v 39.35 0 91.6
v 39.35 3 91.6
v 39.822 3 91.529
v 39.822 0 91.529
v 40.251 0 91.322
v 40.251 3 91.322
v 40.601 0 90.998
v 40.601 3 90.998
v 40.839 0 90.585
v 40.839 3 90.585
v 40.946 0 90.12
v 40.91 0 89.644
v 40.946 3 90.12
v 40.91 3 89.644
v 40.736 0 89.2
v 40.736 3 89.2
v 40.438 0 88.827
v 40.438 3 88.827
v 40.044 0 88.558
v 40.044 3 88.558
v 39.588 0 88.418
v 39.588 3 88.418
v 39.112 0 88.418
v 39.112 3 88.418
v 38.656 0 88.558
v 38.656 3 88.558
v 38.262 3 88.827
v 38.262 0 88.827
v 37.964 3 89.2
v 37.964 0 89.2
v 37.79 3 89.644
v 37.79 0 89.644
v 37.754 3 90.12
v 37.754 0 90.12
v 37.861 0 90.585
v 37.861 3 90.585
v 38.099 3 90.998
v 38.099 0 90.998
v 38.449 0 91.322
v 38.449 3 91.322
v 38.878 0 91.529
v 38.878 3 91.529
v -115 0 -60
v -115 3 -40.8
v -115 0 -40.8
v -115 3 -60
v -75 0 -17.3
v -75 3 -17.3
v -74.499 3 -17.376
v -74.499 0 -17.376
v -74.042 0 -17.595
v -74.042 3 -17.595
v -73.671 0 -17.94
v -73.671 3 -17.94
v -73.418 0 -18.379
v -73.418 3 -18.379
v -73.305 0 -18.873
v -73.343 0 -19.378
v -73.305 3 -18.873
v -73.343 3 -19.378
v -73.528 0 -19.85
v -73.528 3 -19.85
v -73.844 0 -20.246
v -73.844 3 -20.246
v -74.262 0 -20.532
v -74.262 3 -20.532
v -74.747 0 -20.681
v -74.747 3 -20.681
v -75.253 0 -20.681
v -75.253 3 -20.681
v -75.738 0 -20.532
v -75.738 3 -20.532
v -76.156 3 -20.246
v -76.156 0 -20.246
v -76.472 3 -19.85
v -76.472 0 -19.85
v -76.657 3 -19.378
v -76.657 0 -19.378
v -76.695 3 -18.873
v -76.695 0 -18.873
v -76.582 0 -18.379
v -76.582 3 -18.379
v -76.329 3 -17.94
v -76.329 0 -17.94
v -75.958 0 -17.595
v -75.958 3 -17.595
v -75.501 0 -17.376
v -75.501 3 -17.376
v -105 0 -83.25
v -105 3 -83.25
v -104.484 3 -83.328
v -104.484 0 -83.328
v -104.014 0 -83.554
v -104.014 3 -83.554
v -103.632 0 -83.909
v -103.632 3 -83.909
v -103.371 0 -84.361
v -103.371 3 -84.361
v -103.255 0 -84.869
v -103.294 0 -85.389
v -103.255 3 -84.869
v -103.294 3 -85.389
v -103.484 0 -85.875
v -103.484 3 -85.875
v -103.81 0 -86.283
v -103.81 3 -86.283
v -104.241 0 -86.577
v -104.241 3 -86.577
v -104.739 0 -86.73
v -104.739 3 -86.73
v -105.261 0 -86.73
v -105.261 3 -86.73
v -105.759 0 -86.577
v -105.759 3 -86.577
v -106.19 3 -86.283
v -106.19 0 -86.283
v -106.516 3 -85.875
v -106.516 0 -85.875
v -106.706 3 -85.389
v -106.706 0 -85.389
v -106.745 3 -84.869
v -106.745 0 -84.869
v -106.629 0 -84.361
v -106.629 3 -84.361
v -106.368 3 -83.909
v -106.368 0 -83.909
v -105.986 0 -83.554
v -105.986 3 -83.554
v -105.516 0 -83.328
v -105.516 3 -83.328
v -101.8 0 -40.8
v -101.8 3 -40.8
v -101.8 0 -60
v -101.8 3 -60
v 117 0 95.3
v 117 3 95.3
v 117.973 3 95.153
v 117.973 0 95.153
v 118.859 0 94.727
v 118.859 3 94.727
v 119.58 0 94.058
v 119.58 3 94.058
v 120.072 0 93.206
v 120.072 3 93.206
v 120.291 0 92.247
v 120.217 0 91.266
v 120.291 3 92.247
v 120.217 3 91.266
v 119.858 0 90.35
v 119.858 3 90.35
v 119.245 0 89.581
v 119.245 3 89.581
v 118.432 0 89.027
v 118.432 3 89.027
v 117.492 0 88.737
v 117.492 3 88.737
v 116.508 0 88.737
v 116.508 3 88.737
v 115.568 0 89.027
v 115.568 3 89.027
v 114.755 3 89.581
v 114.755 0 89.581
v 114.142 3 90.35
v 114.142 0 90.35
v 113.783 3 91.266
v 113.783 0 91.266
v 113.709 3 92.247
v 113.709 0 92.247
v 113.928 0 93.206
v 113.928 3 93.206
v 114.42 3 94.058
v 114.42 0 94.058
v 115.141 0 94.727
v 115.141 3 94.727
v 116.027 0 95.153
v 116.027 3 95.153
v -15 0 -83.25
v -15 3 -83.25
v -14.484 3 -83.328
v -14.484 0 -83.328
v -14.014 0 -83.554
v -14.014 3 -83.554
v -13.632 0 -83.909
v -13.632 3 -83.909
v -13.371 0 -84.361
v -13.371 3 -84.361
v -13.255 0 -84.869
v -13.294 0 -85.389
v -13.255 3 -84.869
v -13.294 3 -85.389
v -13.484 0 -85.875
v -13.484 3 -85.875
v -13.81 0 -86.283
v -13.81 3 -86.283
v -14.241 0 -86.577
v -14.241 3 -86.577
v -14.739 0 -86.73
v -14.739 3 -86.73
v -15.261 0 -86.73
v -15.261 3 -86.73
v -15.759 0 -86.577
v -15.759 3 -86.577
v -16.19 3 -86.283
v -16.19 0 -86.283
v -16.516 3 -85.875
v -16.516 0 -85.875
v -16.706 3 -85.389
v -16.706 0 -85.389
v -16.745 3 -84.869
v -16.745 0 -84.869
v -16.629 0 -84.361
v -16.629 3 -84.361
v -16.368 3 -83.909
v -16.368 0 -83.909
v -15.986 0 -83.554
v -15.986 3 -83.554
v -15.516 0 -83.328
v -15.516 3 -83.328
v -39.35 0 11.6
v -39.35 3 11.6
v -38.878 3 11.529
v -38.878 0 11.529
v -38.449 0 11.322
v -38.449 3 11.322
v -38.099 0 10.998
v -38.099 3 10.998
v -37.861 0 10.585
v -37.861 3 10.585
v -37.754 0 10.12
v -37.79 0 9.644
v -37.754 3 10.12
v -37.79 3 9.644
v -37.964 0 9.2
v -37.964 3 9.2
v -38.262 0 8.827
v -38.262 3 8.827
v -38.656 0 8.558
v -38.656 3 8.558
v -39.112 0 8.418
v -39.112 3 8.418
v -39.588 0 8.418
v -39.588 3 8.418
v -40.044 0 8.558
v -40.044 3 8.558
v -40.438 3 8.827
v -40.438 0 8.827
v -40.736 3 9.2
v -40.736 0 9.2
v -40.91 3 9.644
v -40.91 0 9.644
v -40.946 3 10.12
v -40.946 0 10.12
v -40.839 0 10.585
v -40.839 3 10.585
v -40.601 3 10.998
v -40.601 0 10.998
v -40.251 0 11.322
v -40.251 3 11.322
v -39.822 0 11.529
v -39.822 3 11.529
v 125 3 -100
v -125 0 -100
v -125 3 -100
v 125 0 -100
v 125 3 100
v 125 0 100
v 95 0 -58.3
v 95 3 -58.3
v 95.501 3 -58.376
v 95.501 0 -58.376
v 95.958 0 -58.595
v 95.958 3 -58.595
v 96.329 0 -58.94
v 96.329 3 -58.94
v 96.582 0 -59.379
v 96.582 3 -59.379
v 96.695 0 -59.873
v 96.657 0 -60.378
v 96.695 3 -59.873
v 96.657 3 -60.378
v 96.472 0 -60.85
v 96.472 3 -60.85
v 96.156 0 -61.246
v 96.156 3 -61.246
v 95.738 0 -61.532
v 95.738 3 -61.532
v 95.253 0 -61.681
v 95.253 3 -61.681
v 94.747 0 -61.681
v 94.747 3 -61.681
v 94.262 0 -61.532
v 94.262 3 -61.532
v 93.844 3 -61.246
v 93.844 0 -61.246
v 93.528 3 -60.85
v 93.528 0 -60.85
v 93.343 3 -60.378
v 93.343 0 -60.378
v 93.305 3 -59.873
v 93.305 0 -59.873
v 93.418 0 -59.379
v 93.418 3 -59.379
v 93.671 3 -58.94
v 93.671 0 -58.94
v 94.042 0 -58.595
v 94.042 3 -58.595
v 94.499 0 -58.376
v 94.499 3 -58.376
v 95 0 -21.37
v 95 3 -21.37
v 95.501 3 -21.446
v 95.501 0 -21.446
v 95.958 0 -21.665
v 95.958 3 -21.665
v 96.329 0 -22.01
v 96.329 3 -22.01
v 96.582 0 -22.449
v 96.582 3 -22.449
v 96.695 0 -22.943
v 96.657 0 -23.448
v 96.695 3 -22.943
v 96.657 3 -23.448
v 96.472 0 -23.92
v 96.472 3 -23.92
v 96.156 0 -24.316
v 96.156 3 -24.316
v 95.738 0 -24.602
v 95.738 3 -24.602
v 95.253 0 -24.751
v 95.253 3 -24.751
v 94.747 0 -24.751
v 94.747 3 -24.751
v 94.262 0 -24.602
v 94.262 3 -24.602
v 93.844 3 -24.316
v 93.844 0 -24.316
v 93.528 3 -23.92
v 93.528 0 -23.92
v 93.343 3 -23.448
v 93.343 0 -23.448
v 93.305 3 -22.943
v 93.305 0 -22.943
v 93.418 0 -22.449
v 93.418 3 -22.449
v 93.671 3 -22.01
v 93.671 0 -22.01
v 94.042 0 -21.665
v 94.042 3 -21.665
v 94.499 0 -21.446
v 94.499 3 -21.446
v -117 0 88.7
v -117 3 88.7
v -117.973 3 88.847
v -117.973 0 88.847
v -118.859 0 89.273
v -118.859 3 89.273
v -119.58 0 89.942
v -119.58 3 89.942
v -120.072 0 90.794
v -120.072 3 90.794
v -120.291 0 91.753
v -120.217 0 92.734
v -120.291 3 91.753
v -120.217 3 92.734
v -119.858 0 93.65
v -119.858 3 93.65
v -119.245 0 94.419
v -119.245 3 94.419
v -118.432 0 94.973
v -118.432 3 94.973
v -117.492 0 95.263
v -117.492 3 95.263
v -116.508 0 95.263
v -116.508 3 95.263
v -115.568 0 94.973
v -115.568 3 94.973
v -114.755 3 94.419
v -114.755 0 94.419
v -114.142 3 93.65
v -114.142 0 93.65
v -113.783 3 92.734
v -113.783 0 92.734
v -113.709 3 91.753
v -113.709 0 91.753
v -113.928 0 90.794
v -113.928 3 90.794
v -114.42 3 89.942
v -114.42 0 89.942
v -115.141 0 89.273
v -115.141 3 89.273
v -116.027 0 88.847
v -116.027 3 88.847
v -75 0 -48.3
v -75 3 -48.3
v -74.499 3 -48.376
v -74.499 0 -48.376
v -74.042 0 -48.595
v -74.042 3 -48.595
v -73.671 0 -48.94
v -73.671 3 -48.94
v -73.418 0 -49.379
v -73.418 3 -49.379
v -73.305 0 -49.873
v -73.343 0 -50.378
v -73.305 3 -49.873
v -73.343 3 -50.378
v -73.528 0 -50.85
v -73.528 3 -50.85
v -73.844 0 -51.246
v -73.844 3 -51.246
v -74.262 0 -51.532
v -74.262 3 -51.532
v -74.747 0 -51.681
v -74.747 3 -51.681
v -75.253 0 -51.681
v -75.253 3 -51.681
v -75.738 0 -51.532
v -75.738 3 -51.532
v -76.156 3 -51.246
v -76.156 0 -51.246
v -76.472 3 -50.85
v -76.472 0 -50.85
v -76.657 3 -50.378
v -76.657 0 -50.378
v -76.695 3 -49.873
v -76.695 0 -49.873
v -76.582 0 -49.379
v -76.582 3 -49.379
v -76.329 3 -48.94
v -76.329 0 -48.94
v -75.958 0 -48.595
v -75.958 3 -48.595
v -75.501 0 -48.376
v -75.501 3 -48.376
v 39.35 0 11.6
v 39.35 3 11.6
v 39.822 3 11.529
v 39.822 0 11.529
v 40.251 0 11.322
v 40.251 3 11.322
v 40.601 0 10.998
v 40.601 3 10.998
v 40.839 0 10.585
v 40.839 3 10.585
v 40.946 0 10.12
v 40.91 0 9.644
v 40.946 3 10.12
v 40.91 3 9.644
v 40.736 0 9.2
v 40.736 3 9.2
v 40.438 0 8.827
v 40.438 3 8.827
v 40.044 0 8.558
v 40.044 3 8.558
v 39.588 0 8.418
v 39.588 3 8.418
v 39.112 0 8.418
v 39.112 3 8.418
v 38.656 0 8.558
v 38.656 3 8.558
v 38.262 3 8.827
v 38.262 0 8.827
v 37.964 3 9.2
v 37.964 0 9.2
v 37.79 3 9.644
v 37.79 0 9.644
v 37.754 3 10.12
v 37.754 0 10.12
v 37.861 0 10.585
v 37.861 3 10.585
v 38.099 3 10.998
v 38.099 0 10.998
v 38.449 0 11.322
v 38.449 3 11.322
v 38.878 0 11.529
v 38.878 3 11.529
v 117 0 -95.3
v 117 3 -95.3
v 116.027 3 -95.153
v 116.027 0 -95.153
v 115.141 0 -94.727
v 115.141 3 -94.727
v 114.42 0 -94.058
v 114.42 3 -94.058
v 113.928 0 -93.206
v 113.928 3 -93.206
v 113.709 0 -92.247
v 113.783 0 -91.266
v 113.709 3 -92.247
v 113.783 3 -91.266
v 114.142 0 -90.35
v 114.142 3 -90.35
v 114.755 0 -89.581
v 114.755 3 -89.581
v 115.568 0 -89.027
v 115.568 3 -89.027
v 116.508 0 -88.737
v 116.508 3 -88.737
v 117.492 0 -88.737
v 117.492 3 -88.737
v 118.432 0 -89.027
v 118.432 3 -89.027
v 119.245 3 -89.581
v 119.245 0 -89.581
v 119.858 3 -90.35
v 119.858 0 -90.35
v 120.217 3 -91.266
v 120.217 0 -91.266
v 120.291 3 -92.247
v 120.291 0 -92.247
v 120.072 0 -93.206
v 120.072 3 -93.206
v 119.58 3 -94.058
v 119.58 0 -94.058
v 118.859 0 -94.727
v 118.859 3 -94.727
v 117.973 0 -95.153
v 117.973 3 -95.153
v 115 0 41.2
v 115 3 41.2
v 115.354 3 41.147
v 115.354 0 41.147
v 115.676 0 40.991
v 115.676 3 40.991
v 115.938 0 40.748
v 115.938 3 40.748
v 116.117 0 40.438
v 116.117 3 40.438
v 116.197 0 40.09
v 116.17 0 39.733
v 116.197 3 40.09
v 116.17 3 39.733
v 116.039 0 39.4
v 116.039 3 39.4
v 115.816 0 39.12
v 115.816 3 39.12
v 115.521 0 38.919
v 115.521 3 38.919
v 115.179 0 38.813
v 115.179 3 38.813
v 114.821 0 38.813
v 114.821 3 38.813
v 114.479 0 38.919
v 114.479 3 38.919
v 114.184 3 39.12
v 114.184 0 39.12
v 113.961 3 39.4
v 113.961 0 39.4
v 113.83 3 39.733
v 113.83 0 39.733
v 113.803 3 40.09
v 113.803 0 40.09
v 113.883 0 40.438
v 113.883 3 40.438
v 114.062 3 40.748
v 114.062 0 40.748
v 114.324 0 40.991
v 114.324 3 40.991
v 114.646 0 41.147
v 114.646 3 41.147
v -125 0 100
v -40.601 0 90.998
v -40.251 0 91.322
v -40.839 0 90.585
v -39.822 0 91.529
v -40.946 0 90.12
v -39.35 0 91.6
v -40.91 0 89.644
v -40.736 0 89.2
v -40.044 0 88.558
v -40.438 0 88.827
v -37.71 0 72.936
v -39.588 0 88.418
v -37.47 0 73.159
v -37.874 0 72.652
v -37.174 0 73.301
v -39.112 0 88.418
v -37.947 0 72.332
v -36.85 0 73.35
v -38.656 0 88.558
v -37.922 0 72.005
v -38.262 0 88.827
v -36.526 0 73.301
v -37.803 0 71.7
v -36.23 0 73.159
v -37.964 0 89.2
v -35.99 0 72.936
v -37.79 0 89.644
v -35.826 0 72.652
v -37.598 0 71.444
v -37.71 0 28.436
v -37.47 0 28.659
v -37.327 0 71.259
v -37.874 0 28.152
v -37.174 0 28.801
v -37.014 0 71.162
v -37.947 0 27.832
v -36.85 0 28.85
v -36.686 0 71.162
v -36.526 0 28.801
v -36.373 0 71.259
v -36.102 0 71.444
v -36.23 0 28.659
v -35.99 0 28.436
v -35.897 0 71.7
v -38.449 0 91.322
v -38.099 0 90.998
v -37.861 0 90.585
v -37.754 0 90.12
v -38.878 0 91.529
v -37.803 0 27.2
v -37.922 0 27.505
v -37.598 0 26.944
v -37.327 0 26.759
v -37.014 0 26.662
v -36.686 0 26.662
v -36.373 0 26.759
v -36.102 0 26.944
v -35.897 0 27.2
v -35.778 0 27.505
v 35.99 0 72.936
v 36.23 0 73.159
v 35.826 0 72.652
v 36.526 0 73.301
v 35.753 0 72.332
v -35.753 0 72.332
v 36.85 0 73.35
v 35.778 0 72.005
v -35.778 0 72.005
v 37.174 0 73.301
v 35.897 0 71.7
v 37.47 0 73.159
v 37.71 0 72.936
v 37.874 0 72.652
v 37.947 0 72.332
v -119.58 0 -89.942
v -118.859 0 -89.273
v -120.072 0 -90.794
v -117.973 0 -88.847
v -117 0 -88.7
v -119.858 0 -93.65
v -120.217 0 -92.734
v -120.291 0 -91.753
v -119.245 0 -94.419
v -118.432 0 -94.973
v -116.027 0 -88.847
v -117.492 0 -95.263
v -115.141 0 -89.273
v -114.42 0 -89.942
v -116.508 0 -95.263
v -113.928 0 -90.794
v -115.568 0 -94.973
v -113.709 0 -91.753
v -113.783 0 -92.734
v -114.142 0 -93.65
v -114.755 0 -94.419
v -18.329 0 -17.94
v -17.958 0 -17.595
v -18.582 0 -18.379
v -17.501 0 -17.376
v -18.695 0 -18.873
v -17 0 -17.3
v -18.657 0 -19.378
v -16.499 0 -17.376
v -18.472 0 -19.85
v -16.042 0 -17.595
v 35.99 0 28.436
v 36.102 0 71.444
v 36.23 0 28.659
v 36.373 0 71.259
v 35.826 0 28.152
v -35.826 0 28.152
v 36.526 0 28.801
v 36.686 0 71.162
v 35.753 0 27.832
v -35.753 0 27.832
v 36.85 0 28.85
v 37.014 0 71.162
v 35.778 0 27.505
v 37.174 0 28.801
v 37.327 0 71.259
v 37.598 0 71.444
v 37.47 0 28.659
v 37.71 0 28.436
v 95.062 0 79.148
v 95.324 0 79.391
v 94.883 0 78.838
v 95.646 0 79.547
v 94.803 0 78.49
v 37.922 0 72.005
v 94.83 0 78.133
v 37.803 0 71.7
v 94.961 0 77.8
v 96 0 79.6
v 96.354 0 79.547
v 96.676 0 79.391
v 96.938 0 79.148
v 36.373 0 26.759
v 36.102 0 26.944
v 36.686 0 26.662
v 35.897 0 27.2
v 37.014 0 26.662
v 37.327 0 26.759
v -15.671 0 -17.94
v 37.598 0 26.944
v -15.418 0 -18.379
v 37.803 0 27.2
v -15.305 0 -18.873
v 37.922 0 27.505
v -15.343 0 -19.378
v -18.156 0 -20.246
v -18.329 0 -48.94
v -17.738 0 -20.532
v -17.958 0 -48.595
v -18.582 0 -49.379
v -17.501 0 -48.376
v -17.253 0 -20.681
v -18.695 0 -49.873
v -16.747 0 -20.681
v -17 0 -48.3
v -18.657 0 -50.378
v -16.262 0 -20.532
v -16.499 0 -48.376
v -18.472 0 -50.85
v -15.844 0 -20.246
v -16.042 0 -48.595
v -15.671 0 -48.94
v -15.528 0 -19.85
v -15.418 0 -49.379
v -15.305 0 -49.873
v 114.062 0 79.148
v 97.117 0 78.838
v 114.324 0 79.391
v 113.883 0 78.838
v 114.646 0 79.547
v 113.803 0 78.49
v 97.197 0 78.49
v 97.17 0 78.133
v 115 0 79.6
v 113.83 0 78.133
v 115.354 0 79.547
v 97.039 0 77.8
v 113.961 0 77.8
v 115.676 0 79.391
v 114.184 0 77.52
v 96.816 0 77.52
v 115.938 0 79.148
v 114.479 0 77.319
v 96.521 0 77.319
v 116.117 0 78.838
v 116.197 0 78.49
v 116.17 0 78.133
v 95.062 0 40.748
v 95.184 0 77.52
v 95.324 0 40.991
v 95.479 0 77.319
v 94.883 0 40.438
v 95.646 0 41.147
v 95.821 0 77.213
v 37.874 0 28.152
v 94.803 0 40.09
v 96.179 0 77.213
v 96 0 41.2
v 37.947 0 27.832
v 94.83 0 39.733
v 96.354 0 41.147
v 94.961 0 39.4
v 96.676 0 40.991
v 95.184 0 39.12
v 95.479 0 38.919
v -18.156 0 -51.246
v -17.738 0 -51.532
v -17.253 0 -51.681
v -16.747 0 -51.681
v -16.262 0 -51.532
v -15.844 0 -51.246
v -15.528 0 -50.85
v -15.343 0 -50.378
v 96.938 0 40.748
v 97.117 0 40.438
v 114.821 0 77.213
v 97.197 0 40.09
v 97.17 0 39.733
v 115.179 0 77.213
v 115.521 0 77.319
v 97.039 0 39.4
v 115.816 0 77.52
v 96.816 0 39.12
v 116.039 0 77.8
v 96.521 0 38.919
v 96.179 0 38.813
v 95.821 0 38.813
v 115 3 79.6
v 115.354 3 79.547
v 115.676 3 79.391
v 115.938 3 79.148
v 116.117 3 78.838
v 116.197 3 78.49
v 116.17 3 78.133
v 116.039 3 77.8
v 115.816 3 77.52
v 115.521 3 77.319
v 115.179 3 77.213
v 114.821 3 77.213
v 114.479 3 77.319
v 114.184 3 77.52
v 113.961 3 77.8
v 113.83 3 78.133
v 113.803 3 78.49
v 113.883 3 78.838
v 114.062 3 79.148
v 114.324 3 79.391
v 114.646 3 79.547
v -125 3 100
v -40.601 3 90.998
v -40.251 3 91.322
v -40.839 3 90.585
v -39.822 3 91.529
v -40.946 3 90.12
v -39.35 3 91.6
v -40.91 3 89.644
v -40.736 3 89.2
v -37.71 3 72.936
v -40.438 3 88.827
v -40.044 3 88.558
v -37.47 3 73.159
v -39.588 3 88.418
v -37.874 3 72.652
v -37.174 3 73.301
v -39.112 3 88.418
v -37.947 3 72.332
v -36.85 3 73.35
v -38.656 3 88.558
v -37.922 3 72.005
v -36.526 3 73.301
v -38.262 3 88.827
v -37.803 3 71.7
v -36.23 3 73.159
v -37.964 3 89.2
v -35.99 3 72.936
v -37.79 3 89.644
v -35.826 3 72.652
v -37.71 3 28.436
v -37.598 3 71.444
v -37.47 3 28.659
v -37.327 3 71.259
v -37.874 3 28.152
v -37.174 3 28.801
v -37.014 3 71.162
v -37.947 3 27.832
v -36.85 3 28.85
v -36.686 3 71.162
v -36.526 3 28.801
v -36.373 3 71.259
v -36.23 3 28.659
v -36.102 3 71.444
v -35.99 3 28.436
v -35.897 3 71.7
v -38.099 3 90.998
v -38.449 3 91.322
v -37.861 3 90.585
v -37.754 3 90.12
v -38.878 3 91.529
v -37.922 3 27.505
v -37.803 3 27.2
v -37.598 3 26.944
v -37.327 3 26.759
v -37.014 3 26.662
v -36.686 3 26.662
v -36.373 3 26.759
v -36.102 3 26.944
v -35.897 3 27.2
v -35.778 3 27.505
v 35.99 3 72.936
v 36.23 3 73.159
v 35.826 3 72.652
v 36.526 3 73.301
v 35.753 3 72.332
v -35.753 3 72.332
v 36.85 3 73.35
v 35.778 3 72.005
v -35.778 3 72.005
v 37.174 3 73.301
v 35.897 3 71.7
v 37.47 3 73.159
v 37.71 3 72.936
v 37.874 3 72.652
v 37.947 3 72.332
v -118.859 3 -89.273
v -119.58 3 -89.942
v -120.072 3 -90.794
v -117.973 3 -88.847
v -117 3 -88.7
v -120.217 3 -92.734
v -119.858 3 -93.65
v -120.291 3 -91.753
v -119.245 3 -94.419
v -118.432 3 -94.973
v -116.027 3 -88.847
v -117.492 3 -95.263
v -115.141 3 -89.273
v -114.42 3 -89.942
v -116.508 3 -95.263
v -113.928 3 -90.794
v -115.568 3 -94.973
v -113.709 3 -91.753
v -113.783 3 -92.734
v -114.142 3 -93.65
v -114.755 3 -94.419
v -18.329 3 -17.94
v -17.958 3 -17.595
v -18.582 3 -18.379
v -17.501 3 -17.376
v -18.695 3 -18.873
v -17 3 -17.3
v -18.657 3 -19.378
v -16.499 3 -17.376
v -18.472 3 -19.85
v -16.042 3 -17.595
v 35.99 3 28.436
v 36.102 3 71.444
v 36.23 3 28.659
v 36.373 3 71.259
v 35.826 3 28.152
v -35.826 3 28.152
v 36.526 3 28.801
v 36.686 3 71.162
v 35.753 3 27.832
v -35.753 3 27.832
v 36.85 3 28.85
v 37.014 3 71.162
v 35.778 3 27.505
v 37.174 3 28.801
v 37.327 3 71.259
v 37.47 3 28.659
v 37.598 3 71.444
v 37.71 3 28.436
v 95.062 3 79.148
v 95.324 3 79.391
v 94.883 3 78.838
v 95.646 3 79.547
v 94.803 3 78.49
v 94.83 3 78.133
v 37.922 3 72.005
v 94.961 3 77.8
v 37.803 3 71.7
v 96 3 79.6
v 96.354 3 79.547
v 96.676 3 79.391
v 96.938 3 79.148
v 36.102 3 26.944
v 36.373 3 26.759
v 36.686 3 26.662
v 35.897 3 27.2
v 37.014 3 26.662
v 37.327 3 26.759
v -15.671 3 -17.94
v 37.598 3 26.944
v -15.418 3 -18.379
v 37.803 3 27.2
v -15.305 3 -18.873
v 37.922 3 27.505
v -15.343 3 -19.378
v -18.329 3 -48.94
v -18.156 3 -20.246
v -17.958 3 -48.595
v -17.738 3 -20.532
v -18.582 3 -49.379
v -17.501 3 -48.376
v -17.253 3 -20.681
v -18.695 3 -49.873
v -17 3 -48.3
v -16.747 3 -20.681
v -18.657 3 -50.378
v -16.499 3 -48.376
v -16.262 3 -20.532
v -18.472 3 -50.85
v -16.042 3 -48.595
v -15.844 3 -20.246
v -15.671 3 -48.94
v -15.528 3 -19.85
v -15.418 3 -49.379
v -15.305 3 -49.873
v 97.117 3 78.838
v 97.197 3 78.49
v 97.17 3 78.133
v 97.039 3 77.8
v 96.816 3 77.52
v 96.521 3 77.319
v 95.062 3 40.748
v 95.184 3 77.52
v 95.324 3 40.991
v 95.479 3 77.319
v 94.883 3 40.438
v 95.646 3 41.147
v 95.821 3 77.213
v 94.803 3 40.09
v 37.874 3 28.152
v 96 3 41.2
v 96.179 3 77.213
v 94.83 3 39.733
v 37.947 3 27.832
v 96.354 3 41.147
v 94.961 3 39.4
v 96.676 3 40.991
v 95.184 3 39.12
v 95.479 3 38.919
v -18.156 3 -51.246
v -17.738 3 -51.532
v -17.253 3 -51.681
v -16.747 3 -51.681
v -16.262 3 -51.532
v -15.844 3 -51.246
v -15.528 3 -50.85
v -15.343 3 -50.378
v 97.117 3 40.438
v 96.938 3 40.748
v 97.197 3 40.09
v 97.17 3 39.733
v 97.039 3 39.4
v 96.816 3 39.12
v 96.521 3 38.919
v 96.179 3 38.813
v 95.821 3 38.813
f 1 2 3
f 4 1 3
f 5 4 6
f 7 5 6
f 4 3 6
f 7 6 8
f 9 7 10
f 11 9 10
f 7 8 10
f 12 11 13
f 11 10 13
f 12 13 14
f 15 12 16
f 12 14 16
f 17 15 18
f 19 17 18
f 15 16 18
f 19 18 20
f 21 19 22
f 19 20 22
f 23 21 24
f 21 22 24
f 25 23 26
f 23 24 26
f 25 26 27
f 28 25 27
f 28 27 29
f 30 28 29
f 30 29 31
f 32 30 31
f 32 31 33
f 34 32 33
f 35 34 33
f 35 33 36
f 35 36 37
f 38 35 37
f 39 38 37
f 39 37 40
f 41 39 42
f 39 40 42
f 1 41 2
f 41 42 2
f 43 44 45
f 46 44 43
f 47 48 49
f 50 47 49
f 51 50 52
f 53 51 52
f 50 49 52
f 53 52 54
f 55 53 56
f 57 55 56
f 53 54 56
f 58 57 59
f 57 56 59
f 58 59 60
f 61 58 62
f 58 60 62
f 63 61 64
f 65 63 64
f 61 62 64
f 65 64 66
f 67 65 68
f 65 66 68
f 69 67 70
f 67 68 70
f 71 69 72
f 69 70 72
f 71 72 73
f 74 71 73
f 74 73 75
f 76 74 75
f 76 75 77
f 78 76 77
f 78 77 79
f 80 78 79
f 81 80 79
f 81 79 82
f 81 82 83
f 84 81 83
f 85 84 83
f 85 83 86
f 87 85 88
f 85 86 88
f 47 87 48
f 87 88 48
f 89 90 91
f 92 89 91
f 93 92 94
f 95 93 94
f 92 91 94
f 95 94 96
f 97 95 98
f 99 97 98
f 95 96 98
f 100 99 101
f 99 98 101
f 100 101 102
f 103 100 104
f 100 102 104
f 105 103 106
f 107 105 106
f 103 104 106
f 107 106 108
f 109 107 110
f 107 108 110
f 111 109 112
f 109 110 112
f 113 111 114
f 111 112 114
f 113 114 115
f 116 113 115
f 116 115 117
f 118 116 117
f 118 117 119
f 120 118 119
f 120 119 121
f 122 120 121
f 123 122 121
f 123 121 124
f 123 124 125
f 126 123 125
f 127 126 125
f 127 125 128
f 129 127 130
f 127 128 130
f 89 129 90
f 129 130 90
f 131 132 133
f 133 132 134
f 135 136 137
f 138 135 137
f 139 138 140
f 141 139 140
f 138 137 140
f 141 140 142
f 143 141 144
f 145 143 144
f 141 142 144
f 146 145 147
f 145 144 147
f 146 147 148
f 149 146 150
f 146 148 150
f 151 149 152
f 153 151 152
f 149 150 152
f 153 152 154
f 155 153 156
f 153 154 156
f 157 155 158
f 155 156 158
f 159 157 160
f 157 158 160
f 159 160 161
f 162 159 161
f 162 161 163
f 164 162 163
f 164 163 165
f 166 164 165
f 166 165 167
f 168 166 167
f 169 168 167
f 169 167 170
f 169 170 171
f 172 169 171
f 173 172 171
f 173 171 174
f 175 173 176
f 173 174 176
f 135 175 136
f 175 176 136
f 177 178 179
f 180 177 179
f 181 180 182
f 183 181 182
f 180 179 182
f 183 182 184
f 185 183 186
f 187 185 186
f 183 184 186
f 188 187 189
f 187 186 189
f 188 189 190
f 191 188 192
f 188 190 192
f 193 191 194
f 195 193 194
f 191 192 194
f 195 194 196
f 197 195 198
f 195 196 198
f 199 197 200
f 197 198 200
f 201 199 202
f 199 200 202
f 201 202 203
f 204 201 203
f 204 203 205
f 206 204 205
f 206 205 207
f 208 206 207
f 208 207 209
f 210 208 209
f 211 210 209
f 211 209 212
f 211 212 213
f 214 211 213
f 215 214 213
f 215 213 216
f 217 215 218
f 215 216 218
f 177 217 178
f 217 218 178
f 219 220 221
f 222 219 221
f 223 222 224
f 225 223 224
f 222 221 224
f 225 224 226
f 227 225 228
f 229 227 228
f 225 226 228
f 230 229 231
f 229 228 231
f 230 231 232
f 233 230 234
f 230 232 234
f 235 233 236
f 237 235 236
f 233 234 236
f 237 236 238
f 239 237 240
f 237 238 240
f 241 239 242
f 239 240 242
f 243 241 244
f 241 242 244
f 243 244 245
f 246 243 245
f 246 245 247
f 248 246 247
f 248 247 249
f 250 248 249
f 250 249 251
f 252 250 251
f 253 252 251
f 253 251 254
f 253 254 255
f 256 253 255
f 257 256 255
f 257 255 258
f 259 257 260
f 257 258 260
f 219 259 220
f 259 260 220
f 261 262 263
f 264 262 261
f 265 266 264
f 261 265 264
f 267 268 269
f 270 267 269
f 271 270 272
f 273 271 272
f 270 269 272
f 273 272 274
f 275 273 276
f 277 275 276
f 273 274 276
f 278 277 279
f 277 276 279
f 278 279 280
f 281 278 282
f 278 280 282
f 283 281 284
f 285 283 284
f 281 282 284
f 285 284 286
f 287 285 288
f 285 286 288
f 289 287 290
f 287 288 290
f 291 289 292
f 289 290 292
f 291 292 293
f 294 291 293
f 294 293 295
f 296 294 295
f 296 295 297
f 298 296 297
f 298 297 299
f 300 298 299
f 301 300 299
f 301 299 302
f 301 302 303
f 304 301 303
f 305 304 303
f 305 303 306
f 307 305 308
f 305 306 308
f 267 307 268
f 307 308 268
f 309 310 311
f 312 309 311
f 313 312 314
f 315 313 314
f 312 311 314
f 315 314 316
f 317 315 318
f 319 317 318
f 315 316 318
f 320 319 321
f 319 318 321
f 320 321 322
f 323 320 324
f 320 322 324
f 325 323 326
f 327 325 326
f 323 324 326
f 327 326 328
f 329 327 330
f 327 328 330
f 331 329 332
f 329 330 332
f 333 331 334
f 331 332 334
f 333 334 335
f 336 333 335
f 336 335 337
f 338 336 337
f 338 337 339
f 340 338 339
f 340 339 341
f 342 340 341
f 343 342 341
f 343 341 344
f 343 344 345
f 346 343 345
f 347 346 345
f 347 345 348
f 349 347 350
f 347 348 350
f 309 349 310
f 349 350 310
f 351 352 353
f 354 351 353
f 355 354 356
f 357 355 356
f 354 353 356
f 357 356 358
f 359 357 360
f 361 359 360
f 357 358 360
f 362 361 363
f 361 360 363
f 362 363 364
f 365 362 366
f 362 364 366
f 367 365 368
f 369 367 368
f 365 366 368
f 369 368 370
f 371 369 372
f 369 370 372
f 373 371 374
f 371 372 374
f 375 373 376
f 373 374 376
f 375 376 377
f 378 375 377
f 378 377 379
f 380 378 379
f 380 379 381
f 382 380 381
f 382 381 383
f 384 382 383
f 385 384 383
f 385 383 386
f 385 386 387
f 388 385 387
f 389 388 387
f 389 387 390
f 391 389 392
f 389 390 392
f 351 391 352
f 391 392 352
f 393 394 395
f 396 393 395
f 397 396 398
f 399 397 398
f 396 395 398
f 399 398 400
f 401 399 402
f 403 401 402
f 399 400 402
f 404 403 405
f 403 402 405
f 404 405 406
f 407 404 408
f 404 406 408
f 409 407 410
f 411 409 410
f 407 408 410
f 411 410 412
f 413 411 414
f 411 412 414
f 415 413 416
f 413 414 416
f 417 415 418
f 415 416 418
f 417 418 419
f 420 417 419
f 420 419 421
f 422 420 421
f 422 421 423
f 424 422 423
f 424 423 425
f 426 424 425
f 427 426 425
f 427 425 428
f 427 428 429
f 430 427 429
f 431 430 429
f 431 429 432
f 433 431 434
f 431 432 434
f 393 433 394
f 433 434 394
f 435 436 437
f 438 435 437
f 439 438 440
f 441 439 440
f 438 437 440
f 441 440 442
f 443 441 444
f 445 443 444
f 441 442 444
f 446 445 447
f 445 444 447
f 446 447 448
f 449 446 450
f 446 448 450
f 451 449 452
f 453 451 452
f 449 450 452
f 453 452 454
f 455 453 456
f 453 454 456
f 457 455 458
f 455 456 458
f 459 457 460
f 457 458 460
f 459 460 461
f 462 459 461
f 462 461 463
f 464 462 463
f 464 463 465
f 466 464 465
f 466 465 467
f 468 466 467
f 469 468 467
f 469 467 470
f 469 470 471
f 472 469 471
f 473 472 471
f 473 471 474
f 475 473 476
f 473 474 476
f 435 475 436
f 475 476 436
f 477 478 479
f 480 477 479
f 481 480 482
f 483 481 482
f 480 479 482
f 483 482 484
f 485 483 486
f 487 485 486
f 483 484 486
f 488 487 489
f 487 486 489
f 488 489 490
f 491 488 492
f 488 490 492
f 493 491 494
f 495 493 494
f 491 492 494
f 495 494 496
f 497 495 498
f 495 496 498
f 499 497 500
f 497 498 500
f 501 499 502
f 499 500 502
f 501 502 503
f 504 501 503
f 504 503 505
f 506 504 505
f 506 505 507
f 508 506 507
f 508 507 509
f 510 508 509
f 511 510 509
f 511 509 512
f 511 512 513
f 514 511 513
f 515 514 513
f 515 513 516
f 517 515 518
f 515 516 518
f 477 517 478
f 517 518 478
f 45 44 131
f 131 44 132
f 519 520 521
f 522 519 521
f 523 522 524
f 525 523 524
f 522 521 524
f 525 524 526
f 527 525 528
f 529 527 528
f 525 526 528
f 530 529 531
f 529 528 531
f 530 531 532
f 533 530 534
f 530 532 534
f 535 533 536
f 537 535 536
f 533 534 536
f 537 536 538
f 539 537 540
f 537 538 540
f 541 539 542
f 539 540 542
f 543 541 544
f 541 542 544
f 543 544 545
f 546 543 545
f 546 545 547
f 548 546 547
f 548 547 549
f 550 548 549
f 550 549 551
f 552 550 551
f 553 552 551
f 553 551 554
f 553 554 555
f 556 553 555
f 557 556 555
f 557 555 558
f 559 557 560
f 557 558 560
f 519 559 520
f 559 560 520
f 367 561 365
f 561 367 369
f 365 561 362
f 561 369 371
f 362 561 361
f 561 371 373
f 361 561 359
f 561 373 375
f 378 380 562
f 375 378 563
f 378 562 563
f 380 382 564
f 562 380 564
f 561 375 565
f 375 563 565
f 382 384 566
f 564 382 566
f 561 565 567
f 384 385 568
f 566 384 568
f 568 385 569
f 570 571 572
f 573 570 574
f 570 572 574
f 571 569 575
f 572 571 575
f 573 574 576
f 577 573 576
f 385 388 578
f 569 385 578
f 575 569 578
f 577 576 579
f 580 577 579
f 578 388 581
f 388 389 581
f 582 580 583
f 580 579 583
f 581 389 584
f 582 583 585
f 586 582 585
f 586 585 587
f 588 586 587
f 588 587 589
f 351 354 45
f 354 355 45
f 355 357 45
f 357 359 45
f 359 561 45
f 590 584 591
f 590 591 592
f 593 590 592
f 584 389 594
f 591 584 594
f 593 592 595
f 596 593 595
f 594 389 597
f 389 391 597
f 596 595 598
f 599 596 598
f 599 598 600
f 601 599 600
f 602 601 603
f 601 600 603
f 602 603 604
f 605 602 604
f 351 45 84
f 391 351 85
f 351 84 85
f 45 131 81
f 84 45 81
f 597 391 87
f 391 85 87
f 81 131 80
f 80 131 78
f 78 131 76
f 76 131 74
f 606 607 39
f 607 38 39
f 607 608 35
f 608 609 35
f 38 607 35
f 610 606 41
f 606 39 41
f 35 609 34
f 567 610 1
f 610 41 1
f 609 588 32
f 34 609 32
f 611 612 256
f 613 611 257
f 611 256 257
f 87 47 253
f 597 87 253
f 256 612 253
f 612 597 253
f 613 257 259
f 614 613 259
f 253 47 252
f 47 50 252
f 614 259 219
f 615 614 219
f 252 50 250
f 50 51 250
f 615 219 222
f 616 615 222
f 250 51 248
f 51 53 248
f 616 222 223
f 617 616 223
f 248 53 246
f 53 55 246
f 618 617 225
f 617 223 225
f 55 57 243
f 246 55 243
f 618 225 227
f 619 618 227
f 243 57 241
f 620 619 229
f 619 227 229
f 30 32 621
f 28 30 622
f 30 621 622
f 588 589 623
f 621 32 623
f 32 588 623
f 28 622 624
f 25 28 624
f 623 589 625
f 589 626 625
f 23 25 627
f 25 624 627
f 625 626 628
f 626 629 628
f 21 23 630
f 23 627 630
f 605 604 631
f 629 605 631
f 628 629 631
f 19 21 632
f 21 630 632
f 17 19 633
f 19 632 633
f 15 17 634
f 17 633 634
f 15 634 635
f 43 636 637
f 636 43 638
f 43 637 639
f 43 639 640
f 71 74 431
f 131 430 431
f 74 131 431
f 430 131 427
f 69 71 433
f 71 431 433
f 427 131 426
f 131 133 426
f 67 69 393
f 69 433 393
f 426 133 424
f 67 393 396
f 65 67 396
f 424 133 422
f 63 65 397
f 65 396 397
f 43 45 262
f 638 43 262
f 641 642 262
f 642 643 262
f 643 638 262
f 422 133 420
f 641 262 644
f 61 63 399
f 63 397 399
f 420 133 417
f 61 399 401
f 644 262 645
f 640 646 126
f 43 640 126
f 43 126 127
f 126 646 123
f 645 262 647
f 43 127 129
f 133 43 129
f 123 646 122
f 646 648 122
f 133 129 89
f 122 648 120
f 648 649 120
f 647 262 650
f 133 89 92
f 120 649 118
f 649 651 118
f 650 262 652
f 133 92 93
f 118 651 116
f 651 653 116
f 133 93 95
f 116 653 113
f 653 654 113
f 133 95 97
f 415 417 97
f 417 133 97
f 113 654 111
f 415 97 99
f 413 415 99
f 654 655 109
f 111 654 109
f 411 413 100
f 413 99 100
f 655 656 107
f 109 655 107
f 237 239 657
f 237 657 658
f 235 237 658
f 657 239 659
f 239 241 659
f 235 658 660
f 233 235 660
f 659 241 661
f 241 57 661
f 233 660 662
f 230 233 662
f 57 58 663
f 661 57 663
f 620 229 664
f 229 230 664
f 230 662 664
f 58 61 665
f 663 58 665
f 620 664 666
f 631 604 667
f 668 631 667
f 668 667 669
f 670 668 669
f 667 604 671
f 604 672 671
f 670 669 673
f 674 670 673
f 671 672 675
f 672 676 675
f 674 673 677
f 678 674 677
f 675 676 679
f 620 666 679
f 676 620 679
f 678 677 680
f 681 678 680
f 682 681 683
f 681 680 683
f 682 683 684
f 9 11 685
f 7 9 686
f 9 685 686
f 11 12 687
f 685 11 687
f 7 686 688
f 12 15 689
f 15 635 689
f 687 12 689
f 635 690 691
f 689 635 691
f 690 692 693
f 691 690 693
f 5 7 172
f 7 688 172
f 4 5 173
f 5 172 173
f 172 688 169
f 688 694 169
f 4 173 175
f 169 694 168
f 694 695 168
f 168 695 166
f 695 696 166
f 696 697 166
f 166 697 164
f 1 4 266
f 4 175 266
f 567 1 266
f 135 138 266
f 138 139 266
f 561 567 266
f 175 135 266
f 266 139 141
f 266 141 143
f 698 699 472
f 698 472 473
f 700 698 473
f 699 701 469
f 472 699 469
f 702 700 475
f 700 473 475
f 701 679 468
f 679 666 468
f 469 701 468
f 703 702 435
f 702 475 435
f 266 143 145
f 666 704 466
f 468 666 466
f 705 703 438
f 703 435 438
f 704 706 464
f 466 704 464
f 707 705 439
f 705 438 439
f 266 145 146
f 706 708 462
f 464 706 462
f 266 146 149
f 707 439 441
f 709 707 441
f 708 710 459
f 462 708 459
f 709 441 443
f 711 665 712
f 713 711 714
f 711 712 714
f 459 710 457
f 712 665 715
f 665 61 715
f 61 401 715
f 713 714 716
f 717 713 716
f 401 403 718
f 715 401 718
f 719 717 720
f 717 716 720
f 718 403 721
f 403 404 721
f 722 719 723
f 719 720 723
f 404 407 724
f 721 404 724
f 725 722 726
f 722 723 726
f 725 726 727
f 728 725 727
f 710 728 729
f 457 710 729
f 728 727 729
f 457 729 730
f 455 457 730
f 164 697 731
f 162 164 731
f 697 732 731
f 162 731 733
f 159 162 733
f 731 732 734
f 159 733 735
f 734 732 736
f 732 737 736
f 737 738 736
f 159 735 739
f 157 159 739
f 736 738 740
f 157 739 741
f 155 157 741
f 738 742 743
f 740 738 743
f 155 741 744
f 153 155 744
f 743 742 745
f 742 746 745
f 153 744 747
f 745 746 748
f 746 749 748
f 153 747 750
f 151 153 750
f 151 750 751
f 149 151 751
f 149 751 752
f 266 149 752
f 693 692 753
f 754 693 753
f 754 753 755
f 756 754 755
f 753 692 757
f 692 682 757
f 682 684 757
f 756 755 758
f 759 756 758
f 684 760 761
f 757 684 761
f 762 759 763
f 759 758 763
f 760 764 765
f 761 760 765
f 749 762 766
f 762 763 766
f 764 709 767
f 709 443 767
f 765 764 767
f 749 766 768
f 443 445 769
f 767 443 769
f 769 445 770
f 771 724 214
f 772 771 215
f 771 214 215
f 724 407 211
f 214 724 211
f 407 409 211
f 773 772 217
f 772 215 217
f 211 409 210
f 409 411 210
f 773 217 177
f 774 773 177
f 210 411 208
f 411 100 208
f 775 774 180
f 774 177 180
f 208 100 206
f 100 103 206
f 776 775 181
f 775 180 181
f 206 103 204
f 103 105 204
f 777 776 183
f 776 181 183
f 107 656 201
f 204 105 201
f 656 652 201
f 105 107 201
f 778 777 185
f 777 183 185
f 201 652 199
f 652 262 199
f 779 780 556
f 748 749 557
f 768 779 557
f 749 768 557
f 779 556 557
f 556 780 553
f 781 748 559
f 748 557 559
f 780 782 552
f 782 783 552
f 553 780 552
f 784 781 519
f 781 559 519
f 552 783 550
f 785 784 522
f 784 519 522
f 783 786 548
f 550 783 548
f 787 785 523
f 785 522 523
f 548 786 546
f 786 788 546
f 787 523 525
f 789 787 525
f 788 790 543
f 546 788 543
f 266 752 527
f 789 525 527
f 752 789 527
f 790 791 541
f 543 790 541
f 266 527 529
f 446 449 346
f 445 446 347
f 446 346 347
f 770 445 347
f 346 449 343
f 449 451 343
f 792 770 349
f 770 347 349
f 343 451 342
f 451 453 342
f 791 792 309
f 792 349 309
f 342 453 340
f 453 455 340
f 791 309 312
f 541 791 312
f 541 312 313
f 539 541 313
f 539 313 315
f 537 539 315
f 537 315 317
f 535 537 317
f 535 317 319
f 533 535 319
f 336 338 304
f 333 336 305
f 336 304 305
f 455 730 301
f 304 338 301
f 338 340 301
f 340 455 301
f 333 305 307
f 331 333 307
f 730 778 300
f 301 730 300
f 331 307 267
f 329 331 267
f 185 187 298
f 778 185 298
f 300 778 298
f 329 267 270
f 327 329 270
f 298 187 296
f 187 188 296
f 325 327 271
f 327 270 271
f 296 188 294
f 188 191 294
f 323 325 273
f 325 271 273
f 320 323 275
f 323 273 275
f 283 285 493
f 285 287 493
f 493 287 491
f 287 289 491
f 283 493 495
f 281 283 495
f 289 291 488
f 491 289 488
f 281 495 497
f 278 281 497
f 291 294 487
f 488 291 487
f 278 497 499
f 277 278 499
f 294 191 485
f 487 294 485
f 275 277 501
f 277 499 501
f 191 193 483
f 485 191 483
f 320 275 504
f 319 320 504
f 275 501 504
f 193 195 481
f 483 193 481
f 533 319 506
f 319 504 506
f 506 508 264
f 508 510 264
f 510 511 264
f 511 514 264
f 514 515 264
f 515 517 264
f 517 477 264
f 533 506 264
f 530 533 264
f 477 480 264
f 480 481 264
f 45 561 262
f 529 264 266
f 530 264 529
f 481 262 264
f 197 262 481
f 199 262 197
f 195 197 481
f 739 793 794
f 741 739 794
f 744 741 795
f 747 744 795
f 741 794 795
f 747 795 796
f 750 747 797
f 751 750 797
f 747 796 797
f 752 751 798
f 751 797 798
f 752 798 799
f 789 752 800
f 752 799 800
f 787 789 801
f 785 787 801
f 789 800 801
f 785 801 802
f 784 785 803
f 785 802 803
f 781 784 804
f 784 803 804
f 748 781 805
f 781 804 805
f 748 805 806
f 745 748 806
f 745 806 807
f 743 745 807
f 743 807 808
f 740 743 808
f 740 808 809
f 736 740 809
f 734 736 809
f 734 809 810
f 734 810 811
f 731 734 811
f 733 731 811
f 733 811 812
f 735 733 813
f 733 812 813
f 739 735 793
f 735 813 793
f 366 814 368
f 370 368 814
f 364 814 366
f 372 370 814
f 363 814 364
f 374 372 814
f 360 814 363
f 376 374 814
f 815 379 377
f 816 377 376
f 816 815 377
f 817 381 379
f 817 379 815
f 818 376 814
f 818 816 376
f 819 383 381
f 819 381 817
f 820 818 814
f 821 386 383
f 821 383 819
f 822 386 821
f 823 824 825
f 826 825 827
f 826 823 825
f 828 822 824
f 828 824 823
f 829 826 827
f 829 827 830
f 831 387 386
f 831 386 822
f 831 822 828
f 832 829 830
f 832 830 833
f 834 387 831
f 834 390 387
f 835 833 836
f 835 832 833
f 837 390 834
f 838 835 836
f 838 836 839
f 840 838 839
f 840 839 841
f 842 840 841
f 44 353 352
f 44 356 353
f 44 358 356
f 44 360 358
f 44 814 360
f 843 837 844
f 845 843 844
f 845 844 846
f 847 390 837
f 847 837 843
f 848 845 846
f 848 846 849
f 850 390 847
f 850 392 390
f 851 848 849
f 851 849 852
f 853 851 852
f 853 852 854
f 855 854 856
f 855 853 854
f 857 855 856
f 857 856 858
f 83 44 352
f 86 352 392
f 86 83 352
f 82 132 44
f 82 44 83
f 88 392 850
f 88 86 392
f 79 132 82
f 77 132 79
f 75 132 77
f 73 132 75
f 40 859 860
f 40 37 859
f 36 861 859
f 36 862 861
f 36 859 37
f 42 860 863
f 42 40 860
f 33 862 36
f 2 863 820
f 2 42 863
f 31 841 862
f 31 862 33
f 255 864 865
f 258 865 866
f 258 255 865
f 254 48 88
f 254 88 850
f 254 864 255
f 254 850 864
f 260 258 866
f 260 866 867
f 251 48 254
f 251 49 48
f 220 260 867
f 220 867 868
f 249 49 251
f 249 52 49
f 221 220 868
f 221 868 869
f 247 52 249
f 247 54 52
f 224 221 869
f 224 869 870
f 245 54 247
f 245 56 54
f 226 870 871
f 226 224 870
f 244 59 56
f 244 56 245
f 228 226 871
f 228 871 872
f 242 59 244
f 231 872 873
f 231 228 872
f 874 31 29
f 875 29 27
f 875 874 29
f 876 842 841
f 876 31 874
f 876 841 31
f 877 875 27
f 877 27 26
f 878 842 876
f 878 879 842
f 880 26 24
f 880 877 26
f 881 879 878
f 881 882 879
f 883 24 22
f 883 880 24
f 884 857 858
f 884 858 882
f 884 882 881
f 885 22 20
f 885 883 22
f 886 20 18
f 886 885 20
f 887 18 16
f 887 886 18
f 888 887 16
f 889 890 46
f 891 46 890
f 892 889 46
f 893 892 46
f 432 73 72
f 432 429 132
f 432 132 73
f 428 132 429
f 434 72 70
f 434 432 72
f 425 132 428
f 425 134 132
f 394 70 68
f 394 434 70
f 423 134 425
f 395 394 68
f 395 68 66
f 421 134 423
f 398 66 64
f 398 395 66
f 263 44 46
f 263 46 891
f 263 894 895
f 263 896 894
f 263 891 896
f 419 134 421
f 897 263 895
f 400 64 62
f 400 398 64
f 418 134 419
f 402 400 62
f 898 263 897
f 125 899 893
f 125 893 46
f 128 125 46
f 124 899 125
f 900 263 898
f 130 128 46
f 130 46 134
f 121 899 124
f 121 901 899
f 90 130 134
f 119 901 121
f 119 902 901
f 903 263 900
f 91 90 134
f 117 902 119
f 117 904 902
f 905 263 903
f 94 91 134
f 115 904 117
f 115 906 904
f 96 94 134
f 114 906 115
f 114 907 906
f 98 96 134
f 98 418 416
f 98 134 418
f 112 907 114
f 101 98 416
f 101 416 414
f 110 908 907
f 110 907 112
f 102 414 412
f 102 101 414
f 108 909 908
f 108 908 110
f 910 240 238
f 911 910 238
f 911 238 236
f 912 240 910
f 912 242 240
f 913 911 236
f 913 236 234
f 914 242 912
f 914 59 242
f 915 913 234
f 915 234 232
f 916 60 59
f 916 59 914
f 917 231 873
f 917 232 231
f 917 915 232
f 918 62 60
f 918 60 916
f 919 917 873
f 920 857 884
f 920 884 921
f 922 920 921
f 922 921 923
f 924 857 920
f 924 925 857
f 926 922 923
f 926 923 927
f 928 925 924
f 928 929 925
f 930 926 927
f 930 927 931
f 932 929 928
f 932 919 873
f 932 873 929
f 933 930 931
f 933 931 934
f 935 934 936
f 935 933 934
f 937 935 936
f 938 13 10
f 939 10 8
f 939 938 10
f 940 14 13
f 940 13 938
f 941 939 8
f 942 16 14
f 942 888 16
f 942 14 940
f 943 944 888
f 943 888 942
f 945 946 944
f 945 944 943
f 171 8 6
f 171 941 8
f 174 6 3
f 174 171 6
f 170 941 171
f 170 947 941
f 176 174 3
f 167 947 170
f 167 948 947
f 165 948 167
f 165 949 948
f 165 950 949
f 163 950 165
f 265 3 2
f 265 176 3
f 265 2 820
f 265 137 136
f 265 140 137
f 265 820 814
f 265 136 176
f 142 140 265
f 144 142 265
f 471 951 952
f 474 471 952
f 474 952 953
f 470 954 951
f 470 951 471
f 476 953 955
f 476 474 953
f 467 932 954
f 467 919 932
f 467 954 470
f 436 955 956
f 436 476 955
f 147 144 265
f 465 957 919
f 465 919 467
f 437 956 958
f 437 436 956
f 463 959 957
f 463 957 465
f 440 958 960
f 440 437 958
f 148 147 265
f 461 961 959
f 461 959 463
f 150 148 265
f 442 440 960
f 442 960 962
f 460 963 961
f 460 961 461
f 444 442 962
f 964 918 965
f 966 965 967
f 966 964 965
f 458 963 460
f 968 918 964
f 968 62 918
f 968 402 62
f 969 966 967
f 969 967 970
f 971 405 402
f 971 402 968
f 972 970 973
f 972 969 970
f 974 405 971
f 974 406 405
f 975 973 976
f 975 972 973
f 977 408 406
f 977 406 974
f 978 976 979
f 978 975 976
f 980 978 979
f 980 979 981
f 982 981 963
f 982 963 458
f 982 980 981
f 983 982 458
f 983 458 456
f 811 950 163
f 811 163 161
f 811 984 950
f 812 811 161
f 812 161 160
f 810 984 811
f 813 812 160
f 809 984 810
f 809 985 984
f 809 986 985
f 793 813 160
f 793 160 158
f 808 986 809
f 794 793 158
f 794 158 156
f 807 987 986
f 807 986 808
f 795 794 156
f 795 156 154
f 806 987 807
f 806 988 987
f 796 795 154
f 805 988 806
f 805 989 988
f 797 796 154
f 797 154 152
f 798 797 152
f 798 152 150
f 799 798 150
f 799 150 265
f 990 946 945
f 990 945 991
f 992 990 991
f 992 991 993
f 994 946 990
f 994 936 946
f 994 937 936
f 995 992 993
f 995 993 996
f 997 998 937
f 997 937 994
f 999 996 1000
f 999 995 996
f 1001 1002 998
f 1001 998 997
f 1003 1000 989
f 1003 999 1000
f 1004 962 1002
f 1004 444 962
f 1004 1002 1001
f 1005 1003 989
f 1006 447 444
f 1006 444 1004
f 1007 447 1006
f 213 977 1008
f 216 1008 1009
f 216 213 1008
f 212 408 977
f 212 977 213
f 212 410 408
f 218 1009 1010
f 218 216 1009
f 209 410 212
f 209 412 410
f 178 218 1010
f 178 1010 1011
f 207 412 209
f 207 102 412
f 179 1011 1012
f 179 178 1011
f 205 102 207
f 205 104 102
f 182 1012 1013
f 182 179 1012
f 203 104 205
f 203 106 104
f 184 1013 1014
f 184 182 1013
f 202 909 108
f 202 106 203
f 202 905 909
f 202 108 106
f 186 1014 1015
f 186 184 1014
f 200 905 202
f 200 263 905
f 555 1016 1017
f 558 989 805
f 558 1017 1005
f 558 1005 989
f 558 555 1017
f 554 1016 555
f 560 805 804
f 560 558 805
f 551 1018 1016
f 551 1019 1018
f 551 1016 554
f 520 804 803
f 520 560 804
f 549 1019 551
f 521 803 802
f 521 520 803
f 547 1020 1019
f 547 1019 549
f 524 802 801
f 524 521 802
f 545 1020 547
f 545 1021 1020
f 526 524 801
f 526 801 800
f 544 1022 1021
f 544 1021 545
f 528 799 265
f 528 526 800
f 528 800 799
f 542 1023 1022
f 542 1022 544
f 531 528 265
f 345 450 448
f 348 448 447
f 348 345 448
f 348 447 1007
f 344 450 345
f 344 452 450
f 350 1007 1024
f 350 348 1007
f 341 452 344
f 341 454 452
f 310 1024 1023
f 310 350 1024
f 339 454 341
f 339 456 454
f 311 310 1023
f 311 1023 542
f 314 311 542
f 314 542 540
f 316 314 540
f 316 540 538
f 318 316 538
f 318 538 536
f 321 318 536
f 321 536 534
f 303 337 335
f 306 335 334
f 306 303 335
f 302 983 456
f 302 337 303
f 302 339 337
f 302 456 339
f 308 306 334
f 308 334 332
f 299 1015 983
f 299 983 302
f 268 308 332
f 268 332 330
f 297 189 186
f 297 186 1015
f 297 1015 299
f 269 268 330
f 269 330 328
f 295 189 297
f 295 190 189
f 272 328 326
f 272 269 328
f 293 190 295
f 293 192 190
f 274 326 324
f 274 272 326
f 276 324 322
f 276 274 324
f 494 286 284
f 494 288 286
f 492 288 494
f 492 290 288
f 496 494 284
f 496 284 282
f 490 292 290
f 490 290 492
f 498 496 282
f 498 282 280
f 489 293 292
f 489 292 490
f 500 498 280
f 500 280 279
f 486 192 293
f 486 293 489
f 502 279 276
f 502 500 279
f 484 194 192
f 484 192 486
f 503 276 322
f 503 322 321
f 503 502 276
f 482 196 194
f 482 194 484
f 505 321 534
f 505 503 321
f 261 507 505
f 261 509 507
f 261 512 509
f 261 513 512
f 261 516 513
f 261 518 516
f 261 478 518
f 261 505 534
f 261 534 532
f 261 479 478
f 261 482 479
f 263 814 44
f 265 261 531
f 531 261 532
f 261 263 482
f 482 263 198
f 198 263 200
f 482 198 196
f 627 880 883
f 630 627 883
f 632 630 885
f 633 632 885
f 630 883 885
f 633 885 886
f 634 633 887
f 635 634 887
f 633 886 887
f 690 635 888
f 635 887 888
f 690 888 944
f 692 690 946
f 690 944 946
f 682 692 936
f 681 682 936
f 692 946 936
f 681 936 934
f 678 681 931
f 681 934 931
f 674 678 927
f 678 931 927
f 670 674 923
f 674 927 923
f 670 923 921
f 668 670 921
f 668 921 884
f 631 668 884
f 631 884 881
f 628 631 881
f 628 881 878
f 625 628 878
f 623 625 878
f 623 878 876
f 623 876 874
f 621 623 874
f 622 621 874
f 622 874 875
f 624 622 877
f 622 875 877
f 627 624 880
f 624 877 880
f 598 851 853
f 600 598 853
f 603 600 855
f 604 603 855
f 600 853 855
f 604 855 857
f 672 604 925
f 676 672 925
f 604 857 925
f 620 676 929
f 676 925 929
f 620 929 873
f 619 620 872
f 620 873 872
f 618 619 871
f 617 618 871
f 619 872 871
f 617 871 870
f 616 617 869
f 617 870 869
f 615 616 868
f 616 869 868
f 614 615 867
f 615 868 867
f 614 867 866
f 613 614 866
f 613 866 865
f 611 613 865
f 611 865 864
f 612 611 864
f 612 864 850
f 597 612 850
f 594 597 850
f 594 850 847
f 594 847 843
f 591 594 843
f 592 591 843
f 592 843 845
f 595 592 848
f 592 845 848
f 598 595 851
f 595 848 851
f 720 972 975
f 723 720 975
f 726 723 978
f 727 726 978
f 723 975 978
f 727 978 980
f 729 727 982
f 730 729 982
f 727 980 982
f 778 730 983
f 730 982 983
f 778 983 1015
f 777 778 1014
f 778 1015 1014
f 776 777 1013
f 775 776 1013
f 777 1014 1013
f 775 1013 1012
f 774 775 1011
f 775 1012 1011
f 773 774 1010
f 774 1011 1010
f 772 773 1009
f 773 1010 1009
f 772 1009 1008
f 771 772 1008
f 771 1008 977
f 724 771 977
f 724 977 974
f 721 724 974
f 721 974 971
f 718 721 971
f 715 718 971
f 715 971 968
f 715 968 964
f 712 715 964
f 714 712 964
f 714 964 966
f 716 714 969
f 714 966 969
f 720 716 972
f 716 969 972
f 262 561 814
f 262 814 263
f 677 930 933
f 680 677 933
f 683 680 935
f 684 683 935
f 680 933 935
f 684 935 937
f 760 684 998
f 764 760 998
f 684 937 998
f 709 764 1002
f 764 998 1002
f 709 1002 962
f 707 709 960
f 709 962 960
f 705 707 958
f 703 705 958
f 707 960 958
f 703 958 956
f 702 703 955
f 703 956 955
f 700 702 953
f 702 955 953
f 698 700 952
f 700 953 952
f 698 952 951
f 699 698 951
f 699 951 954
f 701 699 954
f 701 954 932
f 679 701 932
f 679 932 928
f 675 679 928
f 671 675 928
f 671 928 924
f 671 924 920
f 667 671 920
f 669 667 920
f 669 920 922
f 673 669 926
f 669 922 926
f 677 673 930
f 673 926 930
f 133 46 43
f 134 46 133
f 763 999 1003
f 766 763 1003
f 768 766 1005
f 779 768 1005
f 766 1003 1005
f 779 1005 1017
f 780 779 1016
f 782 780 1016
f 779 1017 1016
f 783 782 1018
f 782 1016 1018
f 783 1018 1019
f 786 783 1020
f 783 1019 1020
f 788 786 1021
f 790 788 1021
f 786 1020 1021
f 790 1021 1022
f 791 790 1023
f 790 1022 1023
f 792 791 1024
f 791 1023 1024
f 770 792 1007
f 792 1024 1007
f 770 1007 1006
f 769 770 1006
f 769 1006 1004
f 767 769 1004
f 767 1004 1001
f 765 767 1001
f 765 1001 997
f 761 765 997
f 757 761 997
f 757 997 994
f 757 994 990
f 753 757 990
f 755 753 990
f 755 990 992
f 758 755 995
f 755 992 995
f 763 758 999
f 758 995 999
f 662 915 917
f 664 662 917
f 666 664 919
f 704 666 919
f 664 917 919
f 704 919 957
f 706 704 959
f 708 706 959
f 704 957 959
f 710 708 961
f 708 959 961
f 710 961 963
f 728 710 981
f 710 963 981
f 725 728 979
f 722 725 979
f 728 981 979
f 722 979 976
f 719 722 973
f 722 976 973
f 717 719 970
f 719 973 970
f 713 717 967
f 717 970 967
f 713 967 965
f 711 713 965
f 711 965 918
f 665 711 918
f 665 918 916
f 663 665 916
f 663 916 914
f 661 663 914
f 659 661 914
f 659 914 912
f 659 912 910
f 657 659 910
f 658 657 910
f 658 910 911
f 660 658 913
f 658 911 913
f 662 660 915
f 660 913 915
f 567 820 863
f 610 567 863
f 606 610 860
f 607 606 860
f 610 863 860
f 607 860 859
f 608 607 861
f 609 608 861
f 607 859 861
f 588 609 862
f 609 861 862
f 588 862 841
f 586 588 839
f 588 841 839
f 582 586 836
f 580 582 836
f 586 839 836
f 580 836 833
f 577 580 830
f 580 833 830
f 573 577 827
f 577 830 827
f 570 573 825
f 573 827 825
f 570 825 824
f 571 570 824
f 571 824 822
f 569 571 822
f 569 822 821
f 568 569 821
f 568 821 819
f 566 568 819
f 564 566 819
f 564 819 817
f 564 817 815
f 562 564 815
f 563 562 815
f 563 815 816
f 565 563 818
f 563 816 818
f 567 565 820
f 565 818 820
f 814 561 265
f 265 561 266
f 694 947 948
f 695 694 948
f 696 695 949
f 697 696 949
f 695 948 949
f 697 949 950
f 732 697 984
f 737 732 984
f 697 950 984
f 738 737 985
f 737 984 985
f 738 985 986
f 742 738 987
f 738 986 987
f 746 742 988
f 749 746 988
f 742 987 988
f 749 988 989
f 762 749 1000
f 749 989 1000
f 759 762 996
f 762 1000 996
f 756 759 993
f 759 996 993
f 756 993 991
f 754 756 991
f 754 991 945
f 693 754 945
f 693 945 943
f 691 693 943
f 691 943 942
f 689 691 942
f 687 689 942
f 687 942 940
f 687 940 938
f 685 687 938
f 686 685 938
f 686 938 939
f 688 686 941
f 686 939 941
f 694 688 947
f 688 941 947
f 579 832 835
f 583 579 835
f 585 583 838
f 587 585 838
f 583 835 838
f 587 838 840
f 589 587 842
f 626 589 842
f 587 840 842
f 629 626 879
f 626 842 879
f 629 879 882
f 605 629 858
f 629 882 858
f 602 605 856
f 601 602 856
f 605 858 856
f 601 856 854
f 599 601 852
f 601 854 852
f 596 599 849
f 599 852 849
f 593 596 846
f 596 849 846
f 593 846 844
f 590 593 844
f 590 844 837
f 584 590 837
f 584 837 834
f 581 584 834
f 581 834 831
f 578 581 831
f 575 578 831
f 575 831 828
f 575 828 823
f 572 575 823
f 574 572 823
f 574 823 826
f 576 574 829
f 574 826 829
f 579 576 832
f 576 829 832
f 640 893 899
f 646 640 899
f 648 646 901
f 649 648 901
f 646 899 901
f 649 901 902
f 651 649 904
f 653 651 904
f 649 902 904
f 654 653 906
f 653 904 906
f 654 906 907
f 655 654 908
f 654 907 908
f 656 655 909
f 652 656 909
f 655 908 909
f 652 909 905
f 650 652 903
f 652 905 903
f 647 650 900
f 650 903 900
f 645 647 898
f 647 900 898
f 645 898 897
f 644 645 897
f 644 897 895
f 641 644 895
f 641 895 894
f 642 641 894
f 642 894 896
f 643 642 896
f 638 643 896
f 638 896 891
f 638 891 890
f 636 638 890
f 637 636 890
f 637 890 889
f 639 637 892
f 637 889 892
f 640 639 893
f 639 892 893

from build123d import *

# Parameters (mm, degrees)
SKETCH2_W           = 250
SKETCH2_H           = 200
BOSS_EXTRUDE2_DEPTH = 3
SKETCH3_R           = 1.75
SKETCH3_R_2         = 3.3
SKETCH3_R_3         = 1.7
SKETCH3_R_4         = 1.2
SKETCH3_R_5         = 1.6
SKETCH3_R_6         = 1.1
SKETCH3_W           = 13.2
SKETCH3_H           = 19.2
CUT_EXTRUDE1_DEPTH  = 3


with BuildPart() as part:
    # Sketch2 → Boss-Extrude2 (new body)
    with BuildSketch(Plane(origin=(0, 0, 0), x_dir=(1, 0, 0), z_dir=(0, 1, 0))):
        Rectangle(SKETCH2_W, SKETCH2_H)
    extrude(amount=BOSS_EXTRUDE2_DEPTH)

    # Sketch3 → Cut-Extrude1 (cut)
    with BuildSketch(Plane(origin=(0, 3, 0), x_dir=(1, 0, 0), z_dir=(0, 1, 0))):
        with Locations(Location((-105, 85, 0), (0, 0, 270))):
            Circle(SKETCH3_R)
        with Locations(Location((-15, 85, 0), (0, 0, 270))):
            Circle(SKETCH3_R)
        with Locations(Location((-117, 92, 0), (0, 0, 270))):
            Circle(SKETCH3_R_2)
        with Locations(Location((-117, -92, 0), (0, 0, 90))):
            Circle(SKETCH3_R_2)
        with Locations(Location((117, 92, 0), (0, 0, 90))):
            Circle(SKETCH3_R_2)
        with Locations(Location((117, -92, 0), (0, 0, 270))):
            Circle(SKETCH3_R_2)
        with Locations(Location((-75, 50, 0), (0, 0, 270))):
            Circle(SKETCH3_R_3)
        with Locations(Location((-17, 50, 0), (0, 0, 270))):
            Circle(SKETCH3_R_3)
        with Locations(Location((-75, 19, 0), (0, 0, 270))):
            Circle(SKETCH3_R_3)
        with Locations(Location((-17, 19, 0), (0, 0, 270))):
            Circle(SKETCH3_R_3)
        with Locations(Location((95, 60, 0), (0, 0, 270))):
            Circle(SKETCH3_R_3)
        with Locations(Location((95, 23.07, 0), (0, 0, 270))):
            Circle(SKETCH3_R_3)
        with Locations(Location((96, -40, 0), (0, 0, 270))):
            Circle(SKETCH3_R_4)
        with Locations(Location((115, -40, 0), (0, 0, 270))):
            Circle(SKETCH3_R_4)
        with Locations(Location((115, -78.4, 0), (0, 0, 270))):
            Circle(SKETCH3_R_4)
        with Locations(Location((96, -78.4, 0), (0, 0, 270))):
            Circle(SKETCH3_R_4)
        with Locations(Location((-39.35, -10, 0), (0, 0, 270))):
            Circle(SKETCH3_R_5)
        with Locations(Location((39.35, -10, 0), (0, 0, 270))):
            Circle(SKETCH3_R_5)
        with Locations(Location((-39.35, -90, 0), (0, 0, 270))):
            Circle(SKETCH3_R_5)
        with Locations(Location((39.35, -90, 0), (0, 0, 270))):
            Circle(SKETCH3_R_5)
        with Locations(Location((-36.85, -27.75, 0), (0, 0, 270))):
            Circle(SKETCH3_R_6)
        with Locations(Location((36.85, -27.75, 0), (0, 0, 270))):
            Circle(SKETCH3_R_6)
        with Locations(Location((36.85, -72.25, 0), (0, 0, 270))):
            Circle(SKETCH3_R_6)
        with Locations(Location((-36.85, -72.25, 0), (0, 0, 270))):
            Circle(SKETCH3_R_6)
        with Locations((-108.4, 50.4)):
            Rectangle(SKETCH3_W, SKETCH3_H)
    extrude(amount=-CUT_EXTRUDE1_DEPTH, mode=Mode.SUBTRACT)


solid = part.part
